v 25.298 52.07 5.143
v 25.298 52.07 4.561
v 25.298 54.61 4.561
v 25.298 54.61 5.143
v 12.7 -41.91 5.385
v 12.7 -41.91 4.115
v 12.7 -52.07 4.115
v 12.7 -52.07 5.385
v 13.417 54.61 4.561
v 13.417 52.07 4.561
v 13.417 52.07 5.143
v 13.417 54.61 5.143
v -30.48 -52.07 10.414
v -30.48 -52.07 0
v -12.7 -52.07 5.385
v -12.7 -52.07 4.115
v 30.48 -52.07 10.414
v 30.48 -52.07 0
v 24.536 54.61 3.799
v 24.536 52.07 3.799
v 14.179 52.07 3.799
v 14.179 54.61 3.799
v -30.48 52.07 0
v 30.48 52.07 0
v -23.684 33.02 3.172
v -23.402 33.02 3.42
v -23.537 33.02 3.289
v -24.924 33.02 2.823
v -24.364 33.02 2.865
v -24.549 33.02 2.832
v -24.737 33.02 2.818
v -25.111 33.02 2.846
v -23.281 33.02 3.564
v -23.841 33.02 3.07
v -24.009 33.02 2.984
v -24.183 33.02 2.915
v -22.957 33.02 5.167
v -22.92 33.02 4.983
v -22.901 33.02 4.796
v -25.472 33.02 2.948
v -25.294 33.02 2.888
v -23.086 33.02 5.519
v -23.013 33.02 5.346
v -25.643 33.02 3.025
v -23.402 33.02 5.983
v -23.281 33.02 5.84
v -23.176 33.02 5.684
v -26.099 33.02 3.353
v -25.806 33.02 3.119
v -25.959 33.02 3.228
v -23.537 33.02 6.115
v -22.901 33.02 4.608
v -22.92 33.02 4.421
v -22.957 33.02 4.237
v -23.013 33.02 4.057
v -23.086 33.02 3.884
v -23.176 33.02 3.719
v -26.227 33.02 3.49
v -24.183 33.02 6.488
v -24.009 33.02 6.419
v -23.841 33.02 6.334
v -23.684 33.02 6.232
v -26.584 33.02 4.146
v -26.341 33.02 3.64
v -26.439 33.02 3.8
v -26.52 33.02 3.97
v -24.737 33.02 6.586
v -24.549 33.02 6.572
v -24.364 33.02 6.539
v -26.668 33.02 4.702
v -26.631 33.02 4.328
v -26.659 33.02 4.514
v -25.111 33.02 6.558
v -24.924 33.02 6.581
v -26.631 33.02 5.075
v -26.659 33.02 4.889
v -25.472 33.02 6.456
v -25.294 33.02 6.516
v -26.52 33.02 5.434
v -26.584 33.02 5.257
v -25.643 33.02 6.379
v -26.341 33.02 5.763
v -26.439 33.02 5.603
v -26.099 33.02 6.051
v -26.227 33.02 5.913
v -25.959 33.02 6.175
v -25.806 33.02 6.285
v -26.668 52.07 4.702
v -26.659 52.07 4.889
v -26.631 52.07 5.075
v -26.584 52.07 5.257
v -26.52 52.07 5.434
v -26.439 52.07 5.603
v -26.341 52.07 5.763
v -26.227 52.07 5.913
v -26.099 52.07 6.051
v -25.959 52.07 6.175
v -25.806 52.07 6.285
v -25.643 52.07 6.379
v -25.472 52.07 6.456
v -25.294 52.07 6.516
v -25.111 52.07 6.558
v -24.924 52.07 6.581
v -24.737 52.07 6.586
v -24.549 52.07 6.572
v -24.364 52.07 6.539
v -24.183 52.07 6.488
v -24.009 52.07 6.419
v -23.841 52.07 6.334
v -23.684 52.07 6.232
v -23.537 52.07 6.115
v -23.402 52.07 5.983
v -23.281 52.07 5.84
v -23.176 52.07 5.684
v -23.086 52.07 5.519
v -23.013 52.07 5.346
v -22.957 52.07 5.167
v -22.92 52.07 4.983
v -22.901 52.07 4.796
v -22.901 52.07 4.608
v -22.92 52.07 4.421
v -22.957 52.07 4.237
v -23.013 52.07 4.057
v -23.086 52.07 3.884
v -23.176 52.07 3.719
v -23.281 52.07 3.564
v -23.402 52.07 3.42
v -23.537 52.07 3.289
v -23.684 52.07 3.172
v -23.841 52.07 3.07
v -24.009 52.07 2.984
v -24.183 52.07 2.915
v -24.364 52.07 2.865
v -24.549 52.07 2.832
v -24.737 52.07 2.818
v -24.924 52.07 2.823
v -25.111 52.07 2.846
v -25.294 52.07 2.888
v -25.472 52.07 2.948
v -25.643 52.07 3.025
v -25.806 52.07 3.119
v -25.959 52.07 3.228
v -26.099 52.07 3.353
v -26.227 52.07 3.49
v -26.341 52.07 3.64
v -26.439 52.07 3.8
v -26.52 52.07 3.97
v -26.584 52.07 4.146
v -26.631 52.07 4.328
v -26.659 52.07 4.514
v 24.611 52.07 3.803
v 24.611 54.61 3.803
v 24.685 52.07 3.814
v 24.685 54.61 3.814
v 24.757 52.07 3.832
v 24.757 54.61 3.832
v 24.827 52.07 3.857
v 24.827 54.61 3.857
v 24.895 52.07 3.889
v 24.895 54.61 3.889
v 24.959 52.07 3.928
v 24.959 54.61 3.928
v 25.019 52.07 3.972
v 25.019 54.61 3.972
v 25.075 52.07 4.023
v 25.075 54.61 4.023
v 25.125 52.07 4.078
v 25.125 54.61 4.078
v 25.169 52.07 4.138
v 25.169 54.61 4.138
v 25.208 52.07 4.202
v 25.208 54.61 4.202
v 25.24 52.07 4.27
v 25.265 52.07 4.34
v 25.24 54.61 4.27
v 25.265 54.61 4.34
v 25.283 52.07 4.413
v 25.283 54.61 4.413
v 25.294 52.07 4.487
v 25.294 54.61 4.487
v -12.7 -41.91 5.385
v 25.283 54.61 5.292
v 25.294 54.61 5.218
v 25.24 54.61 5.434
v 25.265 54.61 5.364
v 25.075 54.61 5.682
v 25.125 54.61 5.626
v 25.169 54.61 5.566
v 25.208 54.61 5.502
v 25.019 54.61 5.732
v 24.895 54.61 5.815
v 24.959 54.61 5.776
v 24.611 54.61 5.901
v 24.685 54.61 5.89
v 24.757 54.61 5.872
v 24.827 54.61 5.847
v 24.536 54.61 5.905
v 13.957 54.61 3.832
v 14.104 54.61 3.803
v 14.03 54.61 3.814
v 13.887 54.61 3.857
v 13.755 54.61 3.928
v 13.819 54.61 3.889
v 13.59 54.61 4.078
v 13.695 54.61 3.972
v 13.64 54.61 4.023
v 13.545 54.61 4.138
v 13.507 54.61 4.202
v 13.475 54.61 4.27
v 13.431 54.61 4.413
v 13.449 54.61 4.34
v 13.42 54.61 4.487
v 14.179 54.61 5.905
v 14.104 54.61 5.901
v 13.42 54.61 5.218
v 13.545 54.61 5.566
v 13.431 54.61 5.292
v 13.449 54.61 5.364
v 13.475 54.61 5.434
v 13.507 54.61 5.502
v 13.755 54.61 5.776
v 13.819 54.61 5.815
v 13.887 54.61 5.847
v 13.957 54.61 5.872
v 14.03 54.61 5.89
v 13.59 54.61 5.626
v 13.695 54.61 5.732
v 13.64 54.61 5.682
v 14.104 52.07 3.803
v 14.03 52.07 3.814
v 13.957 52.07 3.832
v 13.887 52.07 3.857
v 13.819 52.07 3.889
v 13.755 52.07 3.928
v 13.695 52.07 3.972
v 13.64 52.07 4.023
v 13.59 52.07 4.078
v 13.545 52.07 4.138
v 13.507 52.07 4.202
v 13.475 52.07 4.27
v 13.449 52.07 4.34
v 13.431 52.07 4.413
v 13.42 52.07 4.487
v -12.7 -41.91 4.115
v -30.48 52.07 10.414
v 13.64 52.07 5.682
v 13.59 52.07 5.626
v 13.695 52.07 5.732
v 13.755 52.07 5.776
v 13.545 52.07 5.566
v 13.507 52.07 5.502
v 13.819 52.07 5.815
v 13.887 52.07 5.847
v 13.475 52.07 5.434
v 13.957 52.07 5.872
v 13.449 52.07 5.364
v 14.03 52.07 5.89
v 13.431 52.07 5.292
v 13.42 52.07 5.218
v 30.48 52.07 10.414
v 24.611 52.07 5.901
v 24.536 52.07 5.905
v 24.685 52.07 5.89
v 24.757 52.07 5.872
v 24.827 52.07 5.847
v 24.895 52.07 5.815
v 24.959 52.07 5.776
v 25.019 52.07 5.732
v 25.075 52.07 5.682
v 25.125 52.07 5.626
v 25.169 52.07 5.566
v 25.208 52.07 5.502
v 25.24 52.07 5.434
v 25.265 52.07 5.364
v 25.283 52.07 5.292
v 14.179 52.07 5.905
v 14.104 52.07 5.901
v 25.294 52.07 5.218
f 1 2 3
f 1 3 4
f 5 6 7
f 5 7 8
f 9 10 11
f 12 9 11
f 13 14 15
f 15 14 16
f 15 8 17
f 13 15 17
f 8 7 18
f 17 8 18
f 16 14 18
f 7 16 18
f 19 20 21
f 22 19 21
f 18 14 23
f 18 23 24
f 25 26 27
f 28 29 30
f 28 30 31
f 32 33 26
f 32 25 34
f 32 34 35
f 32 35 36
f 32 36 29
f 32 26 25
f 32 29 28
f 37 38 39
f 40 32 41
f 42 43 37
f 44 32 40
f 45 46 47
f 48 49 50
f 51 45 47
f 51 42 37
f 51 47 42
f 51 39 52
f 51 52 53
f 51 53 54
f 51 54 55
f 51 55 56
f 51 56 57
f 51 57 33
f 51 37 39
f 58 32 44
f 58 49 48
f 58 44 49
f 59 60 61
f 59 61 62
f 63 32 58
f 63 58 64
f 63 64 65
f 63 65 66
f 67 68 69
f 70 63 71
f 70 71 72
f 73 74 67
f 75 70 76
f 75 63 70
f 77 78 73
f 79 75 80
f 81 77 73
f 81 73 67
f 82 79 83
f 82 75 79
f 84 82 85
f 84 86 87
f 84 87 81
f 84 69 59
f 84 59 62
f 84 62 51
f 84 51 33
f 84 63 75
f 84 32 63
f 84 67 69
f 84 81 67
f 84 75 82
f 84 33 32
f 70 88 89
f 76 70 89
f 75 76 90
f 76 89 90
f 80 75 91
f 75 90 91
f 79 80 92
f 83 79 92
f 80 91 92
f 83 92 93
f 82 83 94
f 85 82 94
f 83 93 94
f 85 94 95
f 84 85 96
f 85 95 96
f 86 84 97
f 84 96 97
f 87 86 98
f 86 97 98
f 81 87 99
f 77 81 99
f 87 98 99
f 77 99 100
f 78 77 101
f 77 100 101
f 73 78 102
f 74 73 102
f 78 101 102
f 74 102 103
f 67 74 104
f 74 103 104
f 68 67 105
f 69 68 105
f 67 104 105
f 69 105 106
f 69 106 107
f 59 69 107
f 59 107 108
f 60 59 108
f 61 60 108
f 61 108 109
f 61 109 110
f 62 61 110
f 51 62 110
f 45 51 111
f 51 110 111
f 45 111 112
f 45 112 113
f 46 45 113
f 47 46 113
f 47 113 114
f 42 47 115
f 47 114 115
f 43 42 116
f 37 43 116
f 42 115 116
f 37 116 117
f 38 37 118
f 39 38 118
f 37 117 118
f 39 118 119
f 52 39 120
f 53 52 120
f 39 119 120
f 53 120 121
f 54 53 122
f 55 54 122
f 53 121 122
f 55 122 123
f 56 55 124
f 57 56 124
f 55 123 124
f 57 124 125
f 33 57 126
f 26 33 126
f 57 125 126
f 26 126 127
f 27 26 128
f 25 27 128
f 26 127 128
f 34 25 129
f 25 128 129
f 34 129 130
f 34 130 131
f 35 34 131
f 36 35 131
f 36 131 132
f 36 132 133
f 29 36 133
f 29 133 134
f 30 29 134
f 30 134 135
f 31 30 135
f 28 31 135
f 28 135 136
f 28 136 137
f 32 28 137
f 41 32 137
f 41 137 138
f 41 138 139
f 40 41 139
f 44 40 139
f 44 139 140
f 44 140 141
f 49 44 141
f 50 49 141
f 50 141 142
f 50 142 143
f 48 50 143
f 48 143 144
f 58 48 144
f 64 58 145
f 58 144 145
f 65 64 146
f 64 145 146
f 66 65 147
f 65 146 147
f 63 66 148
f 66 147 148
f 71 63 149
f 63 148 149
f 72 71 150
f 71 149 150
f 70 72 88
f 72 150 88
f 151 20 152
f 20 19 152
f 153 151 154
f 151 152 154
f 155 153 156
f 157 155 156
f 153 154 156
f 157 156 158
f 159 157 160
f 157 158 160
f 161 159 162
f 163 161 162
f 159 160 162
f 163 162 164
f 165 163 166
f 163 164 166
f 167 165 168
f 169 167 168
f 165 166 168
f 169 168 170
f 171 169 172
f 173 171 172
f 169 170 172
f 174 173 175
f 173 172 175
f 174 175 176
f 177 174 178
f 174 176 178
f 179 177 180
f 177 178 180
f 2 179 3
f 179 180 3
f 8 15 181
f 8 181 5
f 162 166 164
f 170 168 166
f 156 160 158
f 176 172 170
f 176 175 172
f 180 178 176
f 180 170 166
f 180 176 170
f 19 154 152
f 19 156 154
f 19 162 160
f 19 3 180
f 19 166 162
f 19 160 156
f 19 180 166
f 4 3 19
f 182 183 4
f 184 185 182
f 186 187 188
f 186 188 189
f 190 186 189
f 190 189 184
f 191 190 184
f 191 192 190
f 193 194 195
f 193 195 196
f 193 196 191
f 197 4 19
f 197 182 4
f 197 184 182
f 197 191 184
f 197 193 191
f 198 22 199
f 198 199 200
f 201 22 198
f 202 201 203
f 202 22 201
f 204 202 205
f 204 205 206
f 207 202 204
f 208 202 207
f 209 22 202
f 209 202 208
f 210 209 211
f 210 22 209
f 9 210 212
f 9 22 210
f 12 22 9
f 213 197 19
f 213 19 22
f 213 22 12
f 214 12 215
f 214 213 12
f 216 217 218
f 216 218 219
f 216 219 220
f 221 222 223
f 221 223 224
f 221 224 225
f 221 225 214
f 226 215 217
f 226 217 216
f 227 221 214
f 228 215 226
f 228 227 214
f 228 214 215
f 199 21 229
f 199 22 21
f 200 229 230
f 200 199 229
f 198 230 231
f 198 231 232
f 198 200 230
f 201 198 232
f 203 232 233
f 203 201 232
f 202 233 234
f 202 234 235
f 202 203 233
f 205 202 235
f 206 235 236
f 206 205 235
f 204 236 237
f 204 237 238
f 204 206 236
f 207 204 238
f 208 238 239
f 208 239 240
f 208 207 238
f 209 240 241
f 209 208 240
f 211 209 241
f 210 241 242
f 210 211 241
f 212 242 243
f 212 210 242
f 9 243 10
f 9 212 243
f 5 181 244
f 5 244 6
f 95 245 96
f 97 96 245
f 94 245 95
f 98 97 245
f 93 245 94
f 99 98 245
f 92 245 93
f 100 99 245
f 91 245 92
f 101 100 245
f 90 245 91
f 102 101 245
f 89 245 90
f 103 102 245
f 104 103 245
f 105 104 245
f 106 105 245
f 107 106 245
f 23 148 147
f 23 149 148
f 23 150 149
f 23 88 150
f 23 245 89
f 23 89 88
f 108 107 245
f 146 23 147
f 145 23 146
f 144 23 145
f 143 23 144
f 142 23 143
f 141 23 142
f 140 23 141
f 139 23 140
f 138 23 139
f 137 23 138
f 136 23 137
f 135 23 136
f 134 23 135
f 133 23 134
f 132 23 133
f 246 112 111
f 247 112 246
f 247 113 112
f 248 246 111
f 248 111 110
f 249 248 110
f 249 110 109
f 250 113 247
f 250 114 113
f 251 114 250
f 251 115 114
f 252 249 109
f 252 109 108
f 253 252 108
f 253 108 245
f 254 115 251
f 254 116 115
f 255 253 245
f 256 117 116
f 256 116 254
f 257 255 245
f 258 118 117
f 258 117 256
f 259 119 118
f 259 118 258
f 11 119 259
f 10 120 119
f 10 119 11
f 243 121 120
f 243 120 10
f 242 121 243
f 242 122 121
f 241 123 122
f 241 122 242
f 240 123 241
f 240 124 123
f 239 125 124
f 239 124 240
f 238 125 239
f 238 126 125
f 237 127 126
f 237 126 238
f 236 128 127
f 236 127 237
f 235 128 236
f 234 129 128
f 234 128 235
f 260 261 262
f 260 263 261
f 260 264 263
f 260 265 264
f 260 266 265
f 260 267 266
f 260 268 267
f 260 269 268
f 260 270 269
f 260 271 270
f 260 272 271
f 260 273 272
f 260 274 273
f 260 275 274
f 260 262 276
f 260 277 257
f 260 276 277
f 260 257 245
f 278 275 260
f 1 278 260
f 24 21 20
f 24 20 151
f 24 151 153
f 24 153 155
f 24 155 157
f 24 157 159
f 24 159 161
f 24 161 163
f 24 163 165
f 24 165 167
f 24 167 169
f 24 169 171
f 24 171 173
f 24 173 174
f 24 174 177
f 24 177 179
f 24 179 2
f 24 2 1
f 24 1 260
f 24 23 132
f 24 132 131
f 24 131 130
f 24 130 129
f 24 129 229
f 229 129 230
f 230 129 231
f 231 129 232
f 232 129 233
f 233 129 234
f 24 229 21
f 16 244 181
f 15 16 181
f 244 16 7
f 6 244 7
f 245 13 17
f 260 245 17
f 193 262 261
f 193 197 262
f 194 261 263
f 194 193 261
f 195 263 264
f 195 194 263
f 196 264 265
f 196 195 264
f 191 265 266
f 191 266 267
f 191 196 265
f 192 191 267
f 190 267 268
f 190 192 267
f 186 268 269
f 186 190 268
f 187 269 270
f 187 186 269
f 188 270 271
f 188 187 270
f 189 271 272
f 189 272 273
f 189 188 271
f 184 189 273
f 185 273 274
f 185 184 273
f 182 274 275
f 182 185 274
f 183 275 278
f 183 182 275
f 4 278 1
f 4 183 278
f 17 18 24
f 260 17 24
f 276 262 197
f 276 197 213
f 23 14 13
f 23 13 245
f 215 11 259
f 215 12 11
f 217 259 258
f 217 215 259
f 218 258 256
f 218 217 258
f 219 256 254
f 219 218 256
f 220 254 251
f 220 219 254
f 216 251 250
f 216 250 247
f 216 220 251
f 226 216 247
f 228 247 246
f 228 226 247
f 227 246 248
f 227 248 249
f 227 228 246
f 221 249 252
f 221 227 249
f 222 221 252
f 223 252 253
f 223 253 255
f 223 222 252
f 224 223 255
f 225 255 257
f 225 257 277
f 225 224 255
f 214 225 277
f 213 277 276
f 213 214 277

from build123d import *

# Parameters (mm, degrees)
F0_W     = 60.96
F0_H     = 104.14
F0_W_2   = 49.7204400599
F0_H_2   = 36.4855006337
F1_DEPTH = 10.414
F2_W     = 25.4
F2_H     = 1.27
F3_DEPTH = 10.16
F4_R     = 1.8844419378
F5_DEPTH = 19.05
F6_W     = 11.8811856955
F6_H     = 2.1055263933
F7_DEPTH = 2.54
F8_R     = 0.762


with BuildPart() as f1:
    # F0 (on Top) → F1 (new body)
    with BuildSketch(Plane.XY):
        Rectangle(F0_W, F0_H)
        with Locations((-0.3395788372, 28.8962163031)):
            Rectangle(F0_W_2, F0_H_2, mode=Mode.SUBTRACT)
        with Locations((-0.3395788372, 28.8962163031)):
            Rectangle(F0_W_2, F0_H_2)
    extrude(amount=F1_DEPTH)

    # F2 (on face) → F3 (cut)
    with BuildSketch(Plane.XZ.offset(52.07)):
        with Locations((0, 4.7498)):
            Rectangle(F2_W, F2_H)
    extrude(amount=-F3_DEPTH, mode=Mode.SUBTRACT)

    # F4 (on face) → F5 (cut)
    with BuildSketch(Plane(origin=(0, 52.07, 0), x_dir=(-1, 0, 0), z_dir=(0, 1, 0))):
        with Locations((24.78357777, 4.7017154284)):
            Circle(F4_R)
    extrude(amount=-F5_DEPTH, mode=Mode.SUBTRACT)

    # F6 (on face) → F7 (join)
    with BuildSketch(Plane(origin=(0, 52.07, 0), x_dir=(-1, 0, 0), z_dir=(0, 1, 0))):
        with Locations((-19.3572798744, 4.8521101708)):
            Rectangle(F6_W, F6_H)
    extrude(amount=F7_DEPTH)

    # F8
    f8_edges = [f1.edges().sort_by_distance(p)[0] for p in [
        (13.416687, 53.34, 3.799347),
        (25.297873, 53.34, 3.799347),
        (25.297873, 53.34, 5.904873),
        (13.416687, 53.34, 5.904873),
    ]]
    fillet(f8_edges, radius=F8_R)


solid = f1.part
